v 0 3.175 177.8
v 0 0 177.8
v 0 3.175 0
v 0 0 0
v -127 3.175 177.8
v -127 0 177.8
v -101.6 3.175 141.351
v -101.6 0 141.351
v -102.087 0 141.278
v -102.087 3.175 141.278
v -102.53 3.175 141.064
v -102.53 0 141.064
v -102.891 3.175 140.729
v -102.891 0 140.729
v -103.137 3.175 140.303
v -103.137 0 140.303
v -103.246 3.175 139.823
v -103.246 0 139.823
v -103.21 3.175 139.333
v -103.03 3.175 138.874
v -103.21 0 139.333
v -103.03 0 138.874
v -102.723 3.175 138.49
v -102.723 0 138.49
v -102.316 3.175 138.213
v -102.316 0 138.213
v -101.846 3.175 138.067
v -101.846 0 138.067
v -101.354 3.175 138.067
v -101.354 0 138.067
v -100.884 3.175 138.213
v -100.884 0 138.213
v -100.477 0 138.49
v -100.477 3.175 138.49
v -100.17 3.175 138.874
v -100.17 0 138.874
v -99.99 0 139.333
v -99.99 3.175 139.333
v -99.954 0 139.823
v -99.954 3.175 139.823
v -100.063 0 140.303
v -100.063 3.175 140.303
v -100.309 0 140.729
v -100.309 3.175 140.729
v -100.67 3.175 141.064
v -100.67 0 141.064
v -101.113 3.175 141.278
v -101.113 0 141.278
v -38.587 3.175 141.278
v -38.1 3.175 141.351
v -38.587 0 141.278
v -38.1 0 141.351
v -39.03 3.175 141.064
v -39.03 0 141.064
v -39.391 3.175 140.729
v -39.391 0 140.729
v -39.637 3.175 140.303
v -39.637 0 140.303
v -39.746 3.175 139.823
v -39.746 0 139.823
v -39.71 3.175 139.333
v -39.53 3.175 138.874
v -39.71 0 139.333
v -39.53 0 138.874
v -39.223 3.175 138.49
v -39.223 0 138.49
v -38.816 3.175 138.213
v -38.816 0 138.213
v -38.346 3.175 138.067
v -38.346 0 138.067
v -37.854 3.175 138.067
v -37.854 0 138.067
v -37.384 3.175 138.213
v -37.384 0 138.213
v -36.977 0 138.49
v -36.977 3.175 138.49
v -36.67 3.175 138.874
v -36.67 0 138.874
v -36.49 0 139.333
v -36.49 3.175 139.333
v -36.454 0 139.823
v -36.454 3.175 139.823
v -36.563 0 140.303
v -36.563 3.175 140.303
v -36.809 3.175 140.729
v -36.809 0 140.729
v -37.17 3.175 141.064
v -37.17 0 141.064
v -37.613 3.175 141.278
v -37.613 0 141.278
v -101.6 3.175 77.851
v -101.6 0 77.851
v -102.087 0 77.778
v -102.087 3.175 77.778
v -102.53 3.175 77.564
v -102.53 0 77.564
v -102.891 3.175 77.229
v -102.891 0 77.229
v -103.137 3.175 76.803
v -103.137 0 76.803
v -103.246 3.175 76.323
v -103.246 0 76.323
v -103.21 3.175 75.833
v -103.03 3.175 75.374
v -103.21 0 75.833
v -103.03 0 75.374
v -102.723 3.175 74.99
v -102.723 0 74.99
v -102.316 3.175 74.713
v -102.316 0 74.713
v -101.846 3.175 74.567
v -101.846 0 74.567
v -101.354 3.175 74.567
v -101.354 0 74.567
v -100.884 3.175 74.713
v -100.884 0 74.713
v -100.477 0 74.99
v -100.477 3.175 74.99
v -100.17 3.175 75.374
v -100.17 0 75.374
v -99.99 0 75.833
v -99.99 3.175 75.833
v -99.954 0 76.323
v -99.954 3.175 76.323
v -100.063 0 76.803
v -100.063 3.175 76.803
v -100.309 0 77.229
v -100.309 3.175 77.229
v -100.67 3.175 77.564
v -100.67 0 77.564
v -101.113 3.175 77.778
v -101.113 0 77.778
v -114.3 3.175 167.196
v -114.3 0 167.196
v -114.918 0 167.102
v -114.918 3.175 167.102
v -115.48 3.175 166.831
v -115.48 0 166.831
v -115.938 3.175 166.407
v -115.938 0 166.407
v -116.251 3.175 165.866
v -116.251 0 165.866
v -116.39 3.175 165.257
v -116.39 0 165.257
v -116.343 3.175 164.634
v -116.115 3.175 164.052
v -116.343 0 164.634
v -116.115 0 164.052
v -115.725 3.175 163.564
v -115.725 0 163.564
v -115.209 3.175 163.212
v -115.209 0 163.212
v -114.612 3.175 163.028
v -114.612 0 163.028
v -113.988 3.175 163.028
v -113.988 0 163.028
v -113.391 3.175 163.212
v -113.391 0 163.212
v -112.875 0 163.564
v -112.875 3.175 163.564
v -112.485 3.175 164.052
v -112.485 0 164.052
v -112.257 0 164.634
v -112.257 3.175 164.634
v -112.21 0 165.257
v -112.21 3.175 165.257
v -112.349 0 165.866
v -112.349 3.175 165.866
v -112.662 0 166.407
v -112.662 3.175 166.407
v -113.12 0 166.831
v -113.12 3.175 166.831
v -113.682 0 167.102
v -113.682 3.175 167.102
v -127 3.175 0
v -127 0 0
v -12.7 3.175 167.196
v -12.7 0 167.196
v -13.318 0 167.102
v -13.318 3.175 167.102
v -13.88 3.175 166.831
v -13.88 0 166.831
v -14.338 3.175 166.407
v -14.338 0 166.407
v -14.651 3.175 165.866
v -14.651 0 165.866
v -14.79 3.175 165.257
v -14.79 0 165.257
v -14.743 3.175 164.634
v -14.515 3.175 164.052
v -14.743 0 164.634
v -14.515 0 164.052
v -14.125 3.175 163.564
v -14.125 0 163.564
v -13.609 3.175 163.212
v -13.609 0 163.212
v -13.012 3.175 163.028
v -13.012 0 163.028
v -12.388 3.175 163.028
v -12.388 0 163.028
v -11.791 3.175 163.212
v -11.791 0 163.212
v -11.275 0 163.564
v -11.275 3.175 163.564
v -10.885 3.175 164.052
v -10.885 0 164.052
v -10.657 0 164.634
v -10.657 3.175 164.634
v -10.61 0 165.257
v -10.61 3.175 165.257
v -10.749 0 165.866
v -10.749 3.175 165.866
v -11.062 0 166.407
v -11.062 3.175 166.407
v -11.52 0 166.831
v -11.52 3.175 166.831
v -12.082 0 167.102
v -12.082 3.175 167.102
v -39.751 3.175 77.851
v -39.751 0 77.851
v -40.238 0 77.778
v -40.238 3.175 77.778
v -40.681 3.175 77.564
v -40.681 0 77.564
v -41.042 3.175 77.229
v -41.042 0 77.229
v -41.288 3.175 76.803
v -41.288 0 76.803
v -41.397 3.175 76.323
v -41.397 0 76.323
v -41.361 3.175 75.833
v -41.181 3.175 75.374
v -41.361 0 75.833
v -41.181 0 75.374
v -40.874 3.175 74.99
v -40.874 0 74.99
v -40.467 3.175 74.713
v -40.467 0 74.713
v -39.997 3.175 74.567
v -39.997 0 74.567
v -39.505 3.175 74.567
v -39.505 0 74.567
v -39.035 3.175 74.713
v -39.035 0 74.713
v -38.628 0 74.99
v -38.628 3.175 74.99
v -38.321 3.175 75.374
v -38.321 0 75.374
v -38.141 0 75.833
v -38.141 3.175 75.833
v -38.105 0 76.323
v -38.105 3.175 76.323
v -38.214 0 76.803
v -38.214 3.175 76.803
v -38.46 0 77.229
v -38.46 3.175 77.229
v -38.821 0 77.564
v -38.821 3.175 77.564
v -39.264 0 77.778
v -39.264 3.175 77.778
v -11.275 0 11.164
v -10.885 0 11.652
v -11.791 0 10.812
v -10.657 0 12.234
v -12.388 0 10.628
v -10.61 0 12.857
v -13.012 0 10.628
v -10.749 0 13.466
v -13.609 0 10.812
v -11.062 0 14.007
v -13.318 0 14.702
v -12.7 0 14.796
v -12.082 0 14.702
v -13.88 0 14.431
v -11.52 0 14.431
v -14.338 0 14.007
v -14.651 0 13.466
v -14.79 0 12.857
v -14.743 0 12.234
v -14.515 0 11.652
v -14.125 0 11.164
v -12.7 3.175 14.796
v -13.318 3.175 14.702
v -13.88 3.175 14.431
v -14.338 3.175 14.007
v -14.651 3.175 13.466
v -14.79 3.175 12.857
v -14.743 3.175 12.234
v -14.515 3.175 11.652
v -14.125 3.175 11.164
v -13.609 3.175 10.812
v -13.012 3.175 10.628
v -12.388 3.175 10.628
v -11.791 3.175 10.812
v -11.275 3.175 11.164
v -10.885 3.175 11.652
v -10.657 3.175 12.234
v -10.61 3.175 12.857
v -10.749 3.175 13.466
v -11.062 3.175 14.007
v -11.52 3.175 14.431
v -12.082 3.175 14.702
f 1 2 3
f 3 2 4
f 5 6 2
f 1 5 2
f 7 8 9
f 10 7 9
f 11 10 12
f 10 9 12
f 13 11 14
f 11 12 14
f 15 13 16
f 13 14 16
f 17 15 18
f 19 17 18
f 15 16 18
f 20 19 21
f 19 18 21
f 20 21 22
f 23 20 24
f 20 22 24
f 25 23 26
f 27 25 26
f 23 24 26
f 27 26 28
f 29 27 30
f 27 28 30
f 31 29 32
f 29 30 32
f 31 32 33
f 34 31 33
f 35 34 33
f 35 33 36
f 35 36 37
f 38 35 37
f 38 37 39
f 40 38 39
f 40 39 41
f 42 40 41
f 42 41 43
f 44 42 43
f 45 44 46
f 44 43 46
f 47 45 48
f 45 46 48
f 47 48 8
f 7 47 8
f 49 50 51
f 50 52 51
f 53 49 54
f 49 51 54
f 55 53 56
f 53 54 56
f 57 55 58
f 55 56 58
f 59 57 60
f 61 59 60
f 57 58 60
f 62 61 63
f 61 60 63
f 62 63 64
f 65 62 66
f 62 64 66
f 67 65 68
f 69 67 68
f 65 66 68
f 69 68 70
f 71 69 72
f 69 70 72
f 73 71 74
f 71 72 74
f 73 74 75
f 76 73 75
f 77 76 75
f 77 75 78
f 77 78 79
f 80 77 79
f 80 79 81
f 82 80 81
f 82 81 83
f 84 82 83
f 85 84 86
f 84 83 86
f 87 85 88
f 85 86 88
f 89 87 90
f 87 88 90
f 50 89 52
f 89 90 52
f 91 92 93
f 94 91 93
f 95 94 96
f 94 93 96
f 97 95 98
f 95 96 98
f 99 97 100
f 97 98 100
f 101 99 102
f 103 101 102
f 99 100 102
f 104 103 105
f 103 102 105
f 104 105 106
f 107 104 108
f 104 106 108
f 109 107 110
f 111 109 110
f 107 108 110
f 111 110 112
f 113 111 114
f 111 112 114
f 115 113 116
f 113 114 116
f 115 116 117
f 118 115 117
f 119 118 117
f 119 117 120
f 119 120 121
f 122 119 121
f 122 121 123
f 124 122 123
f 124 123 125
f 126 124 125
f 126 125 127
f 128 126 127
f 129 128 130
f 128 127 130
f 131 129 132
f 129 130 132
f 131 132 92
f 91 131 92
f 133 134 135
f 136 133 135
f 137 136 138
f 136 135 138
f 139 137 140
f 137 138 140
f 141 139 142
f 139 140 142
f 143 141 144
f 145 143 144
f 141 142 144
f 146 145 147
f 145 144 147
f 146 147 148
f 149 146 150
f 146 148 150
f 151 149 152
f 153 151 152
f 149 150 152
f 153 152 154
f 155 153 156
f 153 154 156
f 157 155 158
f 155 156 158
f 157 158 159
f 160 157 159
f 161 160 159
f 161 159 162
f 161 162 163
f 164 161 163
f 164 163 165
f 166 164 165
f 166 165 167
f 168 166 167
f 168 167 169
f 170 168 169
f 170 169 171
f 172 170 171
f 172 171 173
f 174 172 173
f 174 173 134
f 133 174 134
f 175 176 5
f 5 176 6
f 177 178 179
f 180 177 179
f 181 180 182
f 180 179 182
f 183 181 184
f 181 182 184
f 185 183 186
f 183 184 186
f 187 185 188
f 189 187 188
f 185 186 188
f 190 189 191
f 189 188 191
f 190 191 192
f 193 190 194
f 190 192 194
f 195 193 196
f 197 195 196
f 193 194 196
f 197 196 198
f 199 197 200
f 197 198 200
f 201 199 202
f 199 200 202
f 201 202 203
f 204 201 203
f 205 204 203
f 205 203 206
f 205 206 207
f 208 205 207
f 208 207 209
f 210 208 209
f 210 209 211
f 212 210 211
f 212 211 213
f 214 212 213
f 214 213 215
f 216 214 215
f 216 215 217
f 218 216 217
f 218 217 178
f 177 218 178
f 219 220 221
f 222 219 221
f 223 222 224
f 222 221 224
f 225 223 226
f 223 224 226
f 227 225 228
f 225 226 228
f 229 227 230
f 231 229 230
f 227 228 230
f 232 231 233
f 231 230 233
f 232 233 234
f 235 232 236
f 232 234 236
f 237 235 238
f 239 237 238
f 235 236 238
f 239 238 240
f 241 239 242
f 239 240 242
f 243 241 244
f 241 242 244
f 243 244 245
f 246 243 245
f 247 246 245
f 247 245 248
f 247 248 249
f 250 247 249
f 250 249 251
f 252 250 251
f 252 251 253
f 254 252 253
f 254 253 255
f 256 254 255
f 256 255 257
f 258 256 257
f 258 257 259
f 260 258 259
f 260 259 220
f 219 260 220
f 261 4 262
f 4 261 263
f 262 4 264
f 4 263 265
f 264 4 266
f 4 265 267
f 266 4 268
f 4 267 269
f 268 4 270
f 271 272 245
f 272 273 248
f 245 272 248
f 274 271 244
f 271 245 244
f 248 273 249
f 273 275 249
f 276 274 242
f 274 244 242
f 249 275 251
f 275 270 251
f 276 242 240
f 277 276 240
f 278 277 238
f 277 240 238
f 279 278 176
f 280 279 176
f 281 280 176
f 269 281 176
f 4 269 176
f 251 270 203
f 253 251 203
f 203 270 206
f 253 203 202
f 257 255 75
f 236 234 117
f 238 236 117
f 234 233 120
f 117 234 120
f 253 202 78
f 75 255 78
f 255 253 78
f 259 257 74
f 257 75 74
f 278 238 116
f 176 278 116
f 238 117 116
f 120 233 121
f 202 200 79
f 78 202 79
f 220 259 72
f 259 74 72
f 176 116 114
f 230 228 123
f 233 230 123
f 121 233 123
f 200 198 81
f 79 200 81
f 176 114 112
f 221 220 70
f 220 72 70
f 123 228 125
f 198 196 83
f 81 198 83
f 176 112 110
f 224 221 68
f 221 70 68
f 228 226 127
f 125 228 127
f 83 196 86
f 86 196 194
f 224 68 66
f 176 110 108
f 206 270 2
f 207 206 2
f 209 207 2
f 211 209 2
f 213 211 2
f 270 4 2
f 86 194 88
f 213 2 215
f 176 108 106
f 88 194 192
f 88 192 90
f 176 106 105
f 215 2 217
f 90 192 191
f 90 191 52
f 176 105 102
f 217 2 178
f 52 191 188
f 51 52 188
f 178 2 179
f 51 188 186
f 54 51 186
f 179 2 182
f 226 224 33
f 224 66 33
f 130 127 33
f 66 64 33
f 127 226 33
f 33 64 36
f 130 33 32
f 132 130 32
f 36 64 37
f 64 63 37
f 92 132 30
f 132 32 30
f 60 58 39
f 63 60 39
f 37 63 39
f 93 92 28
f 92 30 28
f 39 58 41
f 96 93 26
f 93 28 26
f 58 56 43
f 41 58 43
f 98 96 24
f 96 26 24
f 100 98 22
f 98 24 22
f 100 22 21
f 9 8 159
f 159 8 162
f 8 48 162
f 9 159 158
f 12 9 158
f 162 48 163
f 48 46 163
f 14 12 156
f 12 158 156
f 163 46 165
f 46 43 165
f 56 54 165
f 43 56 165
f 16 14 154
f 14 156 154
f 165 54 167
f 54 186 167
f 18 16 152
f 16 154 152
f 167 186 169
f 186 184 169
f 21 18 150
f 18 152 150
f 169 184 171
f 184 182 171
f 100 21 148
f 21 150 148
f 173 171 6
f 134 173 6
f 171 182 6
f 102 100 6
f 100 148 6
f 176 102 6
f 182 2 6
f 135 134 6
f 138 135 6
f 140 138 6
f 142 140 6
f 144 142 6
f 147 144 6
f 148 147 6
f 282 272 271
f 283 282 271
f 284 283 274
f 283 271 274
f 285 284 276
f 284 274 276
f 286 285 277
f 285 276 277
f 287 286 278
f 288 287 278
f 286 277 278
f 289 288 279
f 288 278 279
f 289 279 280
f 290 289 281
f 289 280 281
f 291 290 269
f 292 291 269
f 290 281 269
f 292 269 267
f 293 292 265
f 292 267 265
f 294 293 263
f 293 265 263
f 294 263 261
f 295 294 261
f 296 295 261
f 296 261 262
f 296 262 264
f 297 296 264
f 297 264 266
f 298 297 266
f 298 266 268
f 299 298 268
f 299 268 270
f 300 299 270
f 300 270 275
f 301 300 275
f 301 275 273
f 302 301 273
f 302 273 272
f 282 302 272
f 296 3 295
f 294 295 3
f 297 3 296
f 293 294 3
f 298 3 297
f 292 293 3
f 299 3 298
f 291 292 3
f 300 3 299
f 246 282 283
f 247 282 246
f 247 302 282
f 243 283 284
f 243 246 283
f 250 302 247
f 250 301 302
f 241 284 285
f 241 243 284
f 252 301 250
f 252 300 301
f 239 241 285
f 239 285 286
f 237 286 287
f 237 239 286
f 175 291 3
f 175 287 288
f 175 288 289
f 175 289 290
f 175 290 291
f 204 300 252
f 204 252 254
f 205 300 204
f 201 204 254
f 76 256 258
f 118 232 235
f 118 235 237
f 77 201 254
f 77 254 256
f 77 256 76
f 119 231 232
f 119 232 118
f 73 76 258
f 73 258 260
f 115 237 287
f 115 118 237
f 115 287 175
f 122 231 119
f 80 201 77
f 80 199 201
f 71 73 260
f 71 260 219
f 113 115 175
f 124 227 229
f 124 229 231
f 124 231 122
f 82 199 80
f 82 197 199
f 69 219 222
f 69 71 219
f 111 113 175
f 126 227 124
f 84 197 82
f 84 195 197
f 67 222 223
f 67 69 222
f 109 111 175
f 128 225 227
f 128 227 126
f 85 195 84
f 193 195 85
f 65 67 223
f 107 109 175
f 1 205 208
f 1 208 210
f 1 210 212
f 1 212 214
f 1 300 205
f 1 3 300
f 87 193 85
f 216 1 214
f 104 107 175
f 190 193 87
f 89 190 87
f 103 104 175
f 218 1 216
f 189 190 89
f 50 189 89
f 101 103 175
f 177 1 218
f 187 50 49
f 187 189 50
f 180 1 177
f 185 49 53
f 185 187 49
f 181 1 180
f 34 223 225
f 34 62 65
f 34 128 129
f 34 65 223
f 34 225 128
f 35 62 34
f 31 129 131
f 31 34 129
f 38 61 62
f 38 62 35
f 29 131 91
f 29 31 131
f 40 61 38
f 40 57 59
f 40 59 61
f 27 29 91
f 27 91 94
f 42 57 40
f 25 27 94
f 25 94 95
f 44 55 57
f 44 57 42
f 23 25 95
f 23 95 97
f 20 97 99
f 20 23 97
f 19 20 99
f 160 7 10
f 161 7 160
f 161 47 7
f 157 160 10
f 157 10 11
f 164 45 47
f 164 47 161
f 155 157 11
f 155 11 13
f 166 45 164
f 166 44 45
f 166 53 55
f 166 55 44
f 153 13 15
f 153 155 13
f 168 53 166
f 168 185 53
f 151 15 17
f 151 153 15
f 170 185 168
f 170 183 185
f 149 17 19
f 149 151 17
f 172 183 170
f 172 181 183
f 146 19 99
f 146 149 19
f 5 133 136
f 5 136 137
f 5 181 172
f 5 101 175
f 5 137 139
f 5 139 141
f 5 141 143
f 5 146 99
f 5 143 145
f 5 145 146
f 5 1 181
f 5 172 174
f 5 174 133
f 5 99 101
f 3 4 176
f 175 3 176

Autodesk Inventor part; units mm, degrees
ref_plane "YZ Plane" through (0, 0, 0) normal (1, 0, 0) x (0, 1, 0)
ref_plane "XZ Plane" through (0, 0, 0) normal (0, 1, 0) x (-1, 0, 0)
ref_plane "XY Plane" through (0, 0, 0) normal (0, 0, 1) x (1, 0, 0)
sketch "Base" plane through (0, 0, 0) normal (0, 1, 0) x (-1, 0, 0)
  line L0 (0, 0) -> (127, 0)
  line L1 (127, 0) -> (127, 177.8)
  line L2 (127, 177.8) -> (0, 177.8)
  line L3 (0, 177.8) -> (0, 0)
  dimension "d7" = 127
  dimension "d8" = 177.8
extrude "Base 1/8\"" add sketch "Base" along normal blind 3.175
sketch "TopLayer" plane through (0, 3.175, 0) normal (0, 1, 0) x (1, 0, 0)
  point P0 (-114.3, -165.1)
  point P1 (-12.7, -165.1)
  point P2 (-12.7, -12.7)
hole "TopLayerHoles" at (-114.3, 3.175, 165.1) at (-12.7, 3.175, 165.1) at (-12.7, 3.175, 12.7) direction (0, -1, 0) diameter 4.191 end through all
sketch "Controller" plane through (0, 3.175, 0) normal (0, 1, 0) x (1, 0, 0)
  line L0 (0, 0) -> (-127, 0) projected
  line L1 (-127, 0) -> (-127, -177.8) projected
  line L2 (-127, -152.4) -> (-25.4, -152.4) construction
  line L3 (-127, -152.4) -> (-25.4, -152.4) construction
  line L4 (-25.4, -152.4) -> (-25.4, 0) construction
  line L5 (-140.6178, -177.8) -> (-108.8678, -177.8) construction
  line L6 (-31.75, -146.05) -> (-107.95, -146.05) construction
  line L7 (-107.95, -146.05) -> (-107.95, -69.85) construction
  line L8 (-107.95, -69.85) -> (-31.75, -69.85) construction
  line L9 (-31.75, -69.85) -> (-31.75, -146.05) construction
  line L10 (-31.75, -146.05) -> (-38.1, -146.05) construction
  line L11 (-38.1, -146.05) -> (-38.1, -139.7) construction
  line L12 (-38.1, -139.7) -> (-31.75, -139.7) construction
  line L13 (-31.75, -139.7) -> (-31.75, -146.05) construction
  line L14 (-107.95, -69.85) -> (-101.6, -69.85) construction
  line L15 (-101.6, -69.85) -> (-101.6, -76.2) construction
  line L16 (-101.6, -76.2) -> (-107.95, -76.2) construction
  line L17 (-107.95, -76.2) -> (-107.95, -69.85) construction
  circle A0 centre (-38.1, -139.7) radius 1.651
  circle A1 centre (-101.6, -139.7) radius 1.651
  circle A2 centre (-101.6, -76.2) radius 1.651
  circle A3 centre (-39.751, -76.2) radius 1.651
  dimension "d36" = 76.2
  dimension "d37" = 76.2
  dimension "d38" = 6.35
  dimension "d39" = 6.35
  dimension "d40" = 6.35
  dimension "d41" = 6.35
  dimension "d42" = 3.302
  dimension "d43" = 3.302
  dimension "d44" = 3.302
  dimension "d45" = 3.302
hole "ControllerHoles" at (-38.1, 3.175, 139.7) at (-39.751, 3.175, 76.2) at (-101.6, 3.175, 76.2) at (-101.6, 3.175, 139.7) direction (0, -1, 0) diameter 3.302 end through all
properties part number "bottomLayer"
